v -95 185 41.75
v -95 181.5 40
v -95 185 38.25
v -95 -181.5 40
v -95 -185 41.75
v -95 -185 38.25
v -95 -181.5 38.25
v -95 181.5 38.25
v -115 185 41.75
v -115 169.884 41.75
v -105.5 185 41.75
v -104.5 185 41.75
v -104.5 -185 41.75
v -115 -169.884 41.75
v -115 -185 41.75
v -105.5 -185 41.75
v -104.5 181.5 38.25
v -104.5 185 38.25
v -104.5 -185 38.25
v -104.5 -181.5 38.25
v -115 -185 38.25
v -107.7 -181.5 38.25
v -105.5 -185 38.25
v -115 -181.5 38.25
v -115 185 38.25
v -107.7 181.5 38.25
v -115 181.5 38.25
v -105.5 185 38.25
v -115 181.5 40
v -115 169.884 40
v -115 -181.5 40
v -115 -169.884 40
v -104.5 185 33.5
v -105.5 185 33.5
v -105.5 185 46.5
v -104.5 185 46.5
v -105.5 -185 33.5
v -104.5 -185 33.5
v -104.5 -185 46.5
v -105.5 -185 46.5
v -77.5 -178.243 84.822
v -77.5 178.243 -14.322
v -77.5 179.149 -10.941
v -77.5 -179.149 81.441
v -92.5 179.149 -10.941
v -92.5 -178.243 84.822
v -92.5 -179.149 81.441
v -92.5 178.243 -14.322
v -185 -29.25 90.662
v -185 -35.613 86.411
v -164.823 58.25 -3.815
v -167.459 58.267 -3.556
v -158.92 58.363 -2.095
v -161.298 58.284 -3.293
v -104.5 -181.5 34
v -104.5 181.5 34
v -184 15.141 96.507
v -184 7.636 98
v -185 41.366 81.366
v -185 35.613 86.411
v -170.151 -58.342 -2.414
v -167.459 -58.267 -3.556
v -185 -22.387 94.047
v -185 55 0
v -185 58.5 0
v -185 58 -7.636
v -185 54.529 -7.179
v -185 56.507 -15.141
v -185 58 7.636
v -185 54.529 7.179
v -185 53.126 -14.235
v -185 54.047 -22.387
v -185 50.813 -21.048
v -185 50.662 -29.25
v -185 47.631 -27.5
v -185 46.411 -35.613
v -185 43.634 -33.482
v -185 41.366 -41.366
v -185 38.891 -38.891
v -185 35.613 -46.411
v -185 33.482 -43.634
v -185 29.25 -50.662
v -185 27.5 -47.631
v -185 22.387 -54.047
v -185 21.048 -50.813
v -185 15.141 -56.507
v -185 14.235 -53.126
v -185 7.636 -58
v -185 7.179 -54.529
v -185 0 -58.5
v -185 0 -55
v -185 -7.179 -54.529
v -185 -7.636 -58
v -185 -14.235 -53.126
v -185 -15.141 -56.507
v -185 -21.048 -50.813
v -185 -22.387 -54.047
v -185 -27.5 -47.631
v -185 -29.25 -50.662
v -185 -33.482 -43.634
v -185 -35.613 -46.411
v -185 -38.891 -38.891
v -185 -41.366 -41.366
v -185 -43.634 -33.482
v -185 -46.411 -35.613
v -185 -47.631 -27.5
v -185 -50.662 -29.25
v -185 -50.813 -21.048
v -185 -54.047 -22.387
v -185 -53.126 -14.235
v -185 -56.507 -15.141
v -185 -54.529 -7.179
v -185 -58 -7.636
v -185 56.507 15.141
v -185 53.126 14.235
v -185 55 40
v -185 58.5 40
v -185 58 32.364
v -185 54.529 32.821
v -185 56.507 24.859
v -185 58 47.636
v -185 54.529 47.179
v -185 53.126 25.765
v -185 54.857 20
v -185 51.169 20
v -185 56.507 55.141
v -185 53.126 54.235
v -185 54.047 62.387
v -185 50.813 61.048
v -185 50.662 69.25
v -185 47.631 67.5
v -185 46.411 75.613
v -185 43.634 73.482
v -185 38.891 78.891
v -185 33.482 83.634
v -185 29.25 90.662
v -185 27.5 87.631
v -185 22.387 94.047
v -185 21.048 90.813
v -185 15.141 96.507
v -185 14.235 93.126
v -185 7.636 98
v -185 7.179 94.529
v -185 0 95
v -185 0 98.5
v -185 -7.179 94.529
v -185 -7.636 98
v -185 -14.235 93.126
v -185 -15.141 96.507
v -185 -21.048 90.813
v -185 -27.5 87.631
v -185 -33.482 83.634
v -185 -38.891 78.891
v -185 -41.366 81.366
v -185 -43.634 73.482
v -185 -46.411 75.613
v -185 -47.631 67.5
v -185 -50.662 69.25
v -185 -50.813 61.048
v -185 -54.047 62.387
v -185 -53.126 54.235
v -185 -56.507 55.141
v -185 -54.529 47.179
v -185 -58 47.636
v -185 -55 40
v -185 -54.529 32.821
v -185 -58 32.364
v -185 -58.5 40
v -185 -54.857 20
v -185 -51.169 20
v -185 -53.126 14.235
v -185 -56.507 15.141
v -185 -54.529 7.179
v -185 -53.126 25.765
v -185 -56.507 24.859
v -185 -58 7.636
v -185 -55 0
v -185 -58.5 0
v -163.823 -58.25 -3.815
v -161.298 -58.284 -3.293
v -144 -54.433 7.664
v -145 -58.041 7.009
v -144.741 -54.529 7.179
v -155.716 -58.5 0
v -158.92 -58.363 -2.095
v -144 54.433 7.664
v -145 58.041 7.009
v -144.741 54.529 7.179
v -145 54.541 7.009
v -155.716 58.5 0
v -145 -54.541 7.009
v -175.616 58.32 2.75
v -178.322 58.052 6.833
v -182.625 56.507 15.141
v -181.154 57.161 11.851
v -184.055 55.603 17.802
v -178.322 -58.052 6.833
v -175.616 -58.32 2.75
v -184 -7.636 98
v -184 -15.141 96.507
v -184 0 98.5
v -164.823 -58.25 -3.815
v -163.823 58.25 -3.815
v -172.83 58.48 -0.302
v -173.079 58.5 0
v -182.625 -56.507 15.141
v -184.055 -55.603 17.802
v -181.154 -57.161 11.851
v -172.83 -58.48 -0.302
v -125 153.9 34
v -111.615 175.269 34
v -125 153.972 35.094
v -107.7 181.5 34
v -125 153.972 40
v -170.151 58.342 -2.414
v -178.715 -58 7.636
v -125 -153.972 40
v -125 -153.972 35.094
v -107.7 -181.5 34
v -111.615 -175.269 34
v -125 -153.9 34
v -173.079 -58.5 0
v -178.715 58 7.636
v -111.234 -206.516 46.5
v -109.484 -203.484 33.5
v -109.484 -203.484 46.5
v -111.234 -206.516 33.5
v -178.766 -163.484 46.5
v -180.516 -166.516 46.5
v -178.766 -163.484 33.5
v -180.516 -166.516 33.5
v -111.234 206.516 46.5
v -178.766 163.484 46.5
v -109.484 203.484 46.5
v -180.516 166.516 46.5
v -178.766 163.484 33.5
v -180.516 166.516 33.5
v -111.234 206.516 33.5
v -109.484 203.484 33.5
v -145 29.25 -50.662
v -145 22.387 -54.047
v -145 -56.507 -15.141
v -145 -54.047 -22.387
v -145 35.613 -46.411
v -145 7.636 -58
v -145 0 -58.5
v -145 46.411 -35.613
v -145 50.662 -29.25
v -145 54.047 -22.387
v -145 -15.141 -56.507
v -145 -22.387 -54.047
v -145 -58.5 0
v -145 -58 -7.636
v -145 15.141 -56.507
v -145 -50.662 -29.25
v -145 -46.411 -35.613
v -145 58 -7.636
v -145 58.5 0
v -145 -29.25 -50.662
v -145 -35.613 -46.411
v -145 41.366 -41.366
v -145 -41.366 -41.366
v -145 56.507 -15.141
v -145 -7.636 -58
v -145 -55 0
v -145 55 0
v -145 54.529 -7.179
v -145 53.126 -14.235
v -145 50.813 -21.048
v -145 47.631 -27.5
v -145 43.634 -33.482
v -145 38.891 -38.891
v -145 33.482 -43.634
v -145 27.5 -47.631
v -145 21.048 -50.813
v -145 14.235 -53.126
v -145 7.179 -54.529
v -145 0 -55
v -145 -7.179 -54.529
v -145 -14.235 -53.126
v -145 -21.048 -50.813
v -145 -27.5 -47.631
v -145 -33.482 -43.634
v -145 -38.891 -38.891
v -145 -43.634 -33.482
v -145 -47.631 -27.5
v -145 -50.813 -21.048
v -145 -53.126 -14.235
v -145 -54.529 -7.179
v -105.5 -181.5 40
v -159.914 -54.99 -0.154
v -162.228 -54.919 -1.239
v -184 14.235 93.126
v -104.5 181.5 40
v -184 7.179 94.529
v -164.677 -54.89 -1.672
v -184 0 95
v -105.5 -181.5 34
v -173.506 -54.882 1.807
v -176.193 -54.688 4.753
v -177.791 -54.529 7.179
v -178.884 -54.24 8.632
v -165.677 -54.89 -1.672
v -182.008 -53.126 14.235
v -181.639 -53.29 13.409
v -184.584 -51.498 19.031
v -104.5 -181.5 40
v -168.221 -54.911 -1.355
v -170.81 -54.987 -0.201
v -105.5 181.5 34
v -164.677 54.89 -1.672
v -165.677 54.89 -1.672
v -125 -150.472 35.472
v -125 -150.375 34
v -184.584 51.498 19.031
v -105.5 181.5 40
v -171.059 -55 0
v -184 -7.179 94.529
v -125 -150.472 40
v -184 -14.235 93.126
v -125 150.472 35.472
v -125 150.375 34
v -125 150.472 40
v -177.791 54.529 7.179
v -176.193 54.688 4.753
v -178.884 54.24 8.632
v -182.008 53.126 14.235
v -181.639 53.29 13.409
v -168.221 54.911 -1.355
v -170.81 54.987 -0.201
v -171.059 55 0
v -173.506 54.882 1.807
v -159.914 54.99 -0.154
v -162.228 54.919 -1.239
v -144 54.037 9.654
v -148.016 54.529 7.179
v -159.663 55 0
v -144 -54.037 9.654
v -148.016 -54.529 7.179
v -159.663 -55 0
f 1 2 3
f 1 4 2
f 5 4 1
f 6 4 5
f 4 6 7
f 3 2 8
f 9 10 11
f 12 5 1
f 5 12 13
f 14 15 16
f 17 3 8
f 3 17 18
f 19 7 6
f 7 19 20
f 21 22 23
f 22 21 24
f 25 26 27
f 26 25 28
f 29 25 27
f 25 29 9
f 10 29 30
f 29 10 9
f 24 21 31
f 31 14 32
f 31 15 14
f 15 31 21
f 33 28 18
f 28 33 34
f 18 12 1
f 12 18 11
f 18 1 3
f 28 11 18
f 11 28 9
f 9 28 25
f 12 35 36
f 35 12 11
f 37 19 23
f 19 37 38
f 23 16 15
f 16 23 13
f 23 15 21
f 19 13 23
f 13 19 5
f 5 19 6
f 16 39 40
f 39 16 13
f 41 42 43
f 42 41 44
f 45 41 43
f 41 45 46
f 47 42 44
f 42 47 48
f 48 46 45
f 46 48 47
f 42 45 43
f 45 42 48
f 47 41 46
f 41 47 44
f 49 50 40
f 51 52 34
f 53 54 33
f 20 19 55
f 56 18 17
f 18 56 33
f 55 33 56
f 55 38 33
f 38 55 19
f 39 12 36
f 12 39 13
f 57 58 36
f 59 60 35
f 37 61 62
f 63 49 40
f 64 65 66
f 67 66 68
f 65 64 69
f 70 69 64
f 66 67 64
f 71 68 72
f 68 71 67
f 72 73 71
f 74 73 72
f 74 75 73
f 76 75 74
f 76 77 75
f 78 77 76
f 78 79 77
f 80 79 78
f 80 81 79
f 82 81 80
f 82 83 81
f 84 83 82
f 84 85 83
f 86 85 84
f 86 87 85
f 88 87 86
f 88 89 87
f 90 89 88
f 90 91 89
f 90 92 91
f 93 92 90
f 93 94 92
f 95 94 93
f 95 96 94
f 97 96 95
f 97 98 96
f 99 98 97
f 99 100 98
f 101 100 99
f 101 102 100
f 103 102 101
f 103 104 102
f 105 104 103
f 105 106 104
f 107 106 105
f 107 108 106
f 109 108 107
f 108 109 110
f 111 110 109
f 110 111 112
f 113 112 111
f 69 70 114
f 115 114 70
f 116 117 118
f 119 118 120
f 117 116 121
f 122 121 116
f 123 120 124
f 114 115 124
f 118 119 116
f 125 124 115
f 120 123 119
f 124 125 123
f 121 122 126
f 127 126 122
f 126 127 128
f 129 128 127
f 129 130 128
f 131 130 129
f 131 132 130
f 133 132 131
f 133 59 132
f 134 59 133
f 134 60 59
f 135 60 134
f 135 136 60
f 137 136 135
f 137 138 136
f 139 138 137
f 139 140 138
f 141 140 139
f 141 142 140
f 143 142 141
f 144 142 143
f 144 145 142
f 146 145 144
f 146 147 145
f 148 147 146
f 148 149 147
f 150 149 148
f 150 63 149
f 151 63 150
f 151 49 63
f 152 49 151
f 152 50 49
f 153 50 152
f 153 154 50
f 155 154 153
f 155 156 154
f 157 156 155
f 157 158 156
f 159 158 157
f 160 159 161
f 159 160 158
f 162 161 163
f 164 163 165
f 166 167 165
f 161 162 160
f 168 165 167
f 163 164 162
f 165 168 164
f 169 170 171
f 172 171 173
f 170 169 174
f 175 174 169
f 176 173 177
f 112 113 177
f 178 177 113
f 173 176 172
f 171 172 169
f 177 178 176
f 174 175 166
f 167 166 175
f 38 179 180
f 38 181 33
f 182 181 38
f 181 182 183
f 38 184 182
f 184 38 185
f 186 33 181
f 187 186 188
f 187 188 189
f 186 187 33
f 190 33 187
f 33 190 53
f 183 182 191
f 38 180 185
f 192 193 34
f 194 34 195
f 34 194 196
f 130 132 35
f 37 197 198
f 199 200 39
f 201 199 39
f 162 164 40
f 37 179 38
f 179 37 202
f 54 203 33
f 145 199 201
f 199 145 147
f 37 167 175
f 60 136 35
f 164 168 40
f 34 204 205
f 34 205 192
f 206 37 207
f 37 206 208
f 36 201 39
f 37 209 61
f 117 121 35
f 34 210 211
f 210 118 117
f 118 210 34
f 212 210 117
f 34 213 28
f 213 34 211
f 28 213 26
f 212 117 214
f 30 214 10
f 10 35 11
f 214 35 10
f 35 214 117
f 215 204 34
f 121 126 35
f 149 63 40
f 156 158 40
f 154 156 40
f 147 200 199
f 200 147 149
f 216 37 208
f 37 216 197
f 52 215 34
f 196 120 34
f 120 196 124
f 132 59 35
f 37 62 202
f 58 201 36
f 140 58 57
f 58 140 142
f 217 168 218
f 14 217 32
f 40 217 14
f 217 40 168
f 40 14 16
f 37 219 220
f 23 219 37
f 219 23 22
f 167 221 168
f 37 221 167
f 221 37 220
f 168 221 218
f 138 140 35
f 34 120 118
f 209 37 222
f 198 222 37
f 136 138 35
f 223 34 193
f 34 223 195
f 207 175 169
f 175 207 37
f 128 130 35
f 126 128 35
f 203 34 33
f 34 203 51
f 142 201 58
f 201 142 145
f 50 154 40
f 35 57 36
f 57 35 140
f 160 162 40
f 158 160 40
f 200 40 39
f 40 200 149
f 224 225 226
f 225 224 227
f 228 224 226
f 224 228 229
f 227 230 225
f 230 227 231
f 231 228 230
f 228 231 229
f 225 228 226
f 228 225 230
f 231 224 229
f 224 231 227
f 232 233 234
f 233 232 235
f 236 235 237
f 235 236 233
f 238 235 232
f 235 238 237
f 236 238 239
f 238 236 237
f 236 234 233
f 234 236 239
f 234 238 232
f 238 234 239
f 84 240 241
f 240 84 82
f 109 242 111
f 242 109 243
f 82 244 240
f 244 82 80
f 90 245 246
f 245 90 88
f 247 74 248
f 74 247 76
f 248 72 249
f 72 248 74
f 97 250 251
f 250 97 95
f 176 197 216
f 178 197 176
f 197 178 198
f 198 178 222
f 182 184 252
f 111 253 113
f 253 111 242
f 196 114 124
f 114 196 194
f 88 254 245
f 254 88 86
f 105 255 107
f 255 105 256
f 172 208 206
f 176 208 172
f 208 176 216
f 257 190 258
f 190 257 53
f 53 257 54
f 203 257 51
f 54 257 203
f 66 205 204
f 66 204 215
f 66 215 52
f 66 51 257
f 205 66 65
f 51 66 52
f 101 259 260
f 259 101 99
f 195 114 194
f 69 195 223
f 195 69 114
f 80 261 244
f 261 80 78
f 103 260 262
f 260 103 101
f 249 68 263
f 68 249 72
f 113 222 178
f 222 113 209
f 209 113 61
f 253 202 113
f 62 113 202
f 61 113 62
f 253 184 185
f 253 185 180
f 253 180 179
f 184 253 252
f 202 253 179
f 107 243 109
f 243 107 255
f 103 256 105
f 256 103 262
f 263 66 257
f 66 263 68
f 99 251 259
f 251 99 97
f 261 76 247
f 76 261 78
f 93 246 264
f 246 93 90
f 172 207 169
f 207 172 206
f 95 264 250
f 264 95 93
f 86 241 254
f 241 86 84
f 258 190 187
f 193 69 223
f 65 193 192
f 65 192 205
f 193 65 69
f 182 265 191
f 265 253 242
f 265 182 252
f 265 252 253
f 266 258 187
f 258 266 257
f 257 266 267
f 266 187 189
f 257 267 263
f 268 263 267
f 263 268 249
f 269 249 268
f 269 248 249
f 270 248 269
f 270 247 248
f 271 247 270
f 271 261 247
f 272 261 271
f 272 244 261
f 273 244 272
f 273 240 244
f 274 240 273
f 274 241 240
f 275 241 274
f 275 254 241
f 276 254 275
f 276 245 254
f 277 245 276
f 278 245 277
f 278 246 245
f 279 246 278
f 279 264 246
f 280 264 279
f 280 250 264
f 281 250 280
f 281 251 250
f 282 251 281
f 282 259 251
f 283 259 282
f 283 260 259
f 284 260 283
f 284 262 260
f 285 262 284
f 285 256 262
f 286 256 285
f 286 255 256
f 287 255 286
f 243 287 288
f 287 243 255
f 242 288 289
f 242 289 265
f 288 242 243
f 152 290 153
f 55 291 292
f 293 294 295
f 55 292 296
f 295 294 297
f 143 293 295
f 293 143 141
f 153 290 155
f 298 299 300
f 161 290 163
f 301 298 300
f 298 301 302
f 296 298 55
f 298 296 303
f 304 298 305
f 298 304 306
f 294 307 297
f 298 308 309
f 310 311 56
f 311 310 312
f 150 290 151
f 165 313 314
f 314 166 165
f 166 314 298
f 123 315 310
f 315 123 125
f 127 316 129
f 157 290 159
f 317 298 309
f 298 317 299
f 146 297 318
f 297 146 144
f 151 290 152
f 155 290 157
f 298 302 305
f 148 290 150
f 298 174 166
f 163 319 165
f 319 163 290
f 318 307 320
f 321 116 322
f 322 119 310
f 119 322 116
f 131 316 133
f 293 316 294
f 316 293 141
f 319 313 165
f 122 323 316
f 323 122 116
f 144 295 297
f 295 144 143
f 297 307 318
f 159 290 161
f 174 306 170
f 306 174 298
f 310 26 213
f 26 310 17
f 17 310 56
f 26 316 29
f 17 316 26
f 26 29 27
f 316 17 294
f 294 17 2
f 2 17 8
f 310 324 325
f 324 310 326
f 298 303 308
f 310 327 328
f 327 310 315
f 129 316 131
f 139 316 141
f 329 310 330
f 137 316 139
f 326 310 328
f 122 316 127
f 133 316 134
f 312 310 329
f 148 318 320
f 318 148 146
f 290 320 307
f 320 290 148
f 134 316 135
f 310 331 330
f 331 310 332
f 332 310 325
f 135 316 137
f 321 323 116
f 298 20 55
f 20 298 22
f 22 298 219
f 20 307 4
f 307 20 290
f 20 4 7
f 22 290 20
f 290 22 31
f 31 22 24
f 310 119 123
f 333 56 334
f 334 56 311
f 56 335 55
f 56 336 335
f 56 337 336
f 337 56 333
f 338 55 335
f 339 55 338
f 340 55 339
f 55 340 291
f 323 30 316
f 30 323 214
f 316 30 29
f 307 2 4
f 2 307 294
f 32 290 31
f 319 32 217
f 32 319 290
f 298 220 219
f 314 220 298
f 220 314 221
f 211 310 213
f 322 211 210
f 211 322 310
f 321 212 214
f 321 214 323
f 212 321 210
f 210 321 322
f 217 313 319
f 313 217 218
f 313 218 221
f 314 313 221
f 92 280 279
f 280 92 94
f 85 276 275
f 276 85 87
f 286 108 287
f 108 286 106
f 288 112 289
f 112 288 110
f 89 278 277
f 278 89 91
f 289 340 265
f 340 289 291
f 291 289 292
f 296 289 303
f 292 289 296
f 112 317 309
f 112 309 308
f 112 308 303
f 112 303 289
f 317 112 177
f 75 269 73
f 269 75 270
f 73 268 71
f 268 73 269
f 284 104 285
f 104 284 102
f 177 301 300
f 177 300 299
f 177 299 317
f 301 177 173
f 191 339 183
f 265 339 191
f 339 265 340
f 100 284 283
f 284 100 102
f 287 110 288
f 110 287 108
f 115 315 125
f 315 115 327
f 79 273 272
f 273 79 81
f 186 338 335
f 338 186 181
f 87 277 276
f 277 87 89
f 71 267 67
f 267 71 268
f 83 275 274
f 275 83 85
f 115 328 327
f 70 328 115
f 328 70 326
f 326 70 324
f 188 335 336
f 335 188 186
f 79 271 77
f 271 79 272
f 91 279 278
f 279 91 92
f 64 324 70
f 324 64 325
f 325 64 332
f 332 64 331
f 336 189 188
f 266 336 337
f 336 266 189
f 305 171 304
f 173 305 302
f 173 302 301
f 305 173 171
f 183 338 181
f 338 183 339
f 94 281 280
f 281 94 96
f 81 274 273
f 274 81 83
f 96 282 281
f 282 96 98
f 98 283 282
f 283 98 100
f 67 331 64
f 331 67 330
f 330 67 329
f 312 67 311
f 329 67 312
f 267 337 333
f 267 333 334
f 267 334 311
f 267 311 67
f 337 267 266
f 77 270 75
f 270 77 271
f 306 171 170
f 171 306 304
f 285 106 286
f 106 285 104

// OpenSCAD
// VORTEX WATERFALL SPREADER — single piece, 340mm wide
// Re-designed to catch the spinning water from the vortex venturi
// The vortex makes the water sheet twist as it falls = light-catching waterfall
//
// Features:
// - 340mm wide (max single-piece on Qidi 350mm bed)
// - 6mm gap for visible water sheet
// - Angled lip (15° down) prevents wind blow-back
// - V-notches every 20mm break sheet into individual twisting streams
// - Flared side walls guide the spinning water into a smooth fan
//
// Print: PA12-CF, 0.2mm layer, flat on bed, NO supports needed

/* [Pipe Connection] */
INLET_DIA = 110;        // mm — matches vortex venturi outlet
COUPLING_DEPTH = 40;    // mm
WALL = 3.5;             // mm

/* [Spreader Geometry] */
SPREAD_WIDTH = 370;     // mm — max single-piece on 392mm X-axis (11mm margin each side)
GAP = 6;                // mm — slot opening (6mm = visible waterfall sheet + good aeration)
LIP_ANGLE = 15;         // degrees — downward angle for wind protection
TRANSITION_LENGTH = 80; // mm — round-inlet to rectangular-slot transition

/* [Vortex Enhancement] */
FLARE_ANGLE = 30;       // degrees — side walls flare outward to spread the spinning water
LIP_GLYPH_DEPTH = 4;    // mm — depth of V-notch glyphs on the lip

$fn = 48;

INNER_R = INLET_DIA / 2;
OUTER_R = INNER_R + WALL;

// Water entry tube + transition to wide slot
module spreader_body() {
    difference() {
        union() {
            // Inlet tube (connects to venturi outlet)
            translate([-SPREAD_WIDTH/2, 0, 0]) {
                rotate([0, 90, 0]) {
                    cylinder(h=COUPLING_DEPTH, r=OUTER_R);
                }
            }
            
            // Flared transition: round tube → wide rectangular slot
            translate([-SPREAD_WIDTH/2, 0, COUPLING_DEPTH]) {
                hull() {
                    // Inlet end (round)
                    translate([0, 0, 0]) {
                        rotate([0, 90, 0]) {
                            cylinder(h=1, r=OUTER_R);
                        }
                    }
                    // Outlet end (wide slot with flared sides)
                    translate([TRANSITION_LENGTH, 0, 0]) {
                        cube([1, SPREAD_WIDTH, GAP + WALL*2], center=true);
                    }
                }
                
                // Side wall flares — these guide the spinning water outward
                // Left flare
                translate([TRANSITION_LENGTH * 0.5, -SPREAD_WIDTH/2, 0]) {
                    rotate([0, 0, -FLARE_ANGLE]) {
                        cube([TRANSITION_LENGTH, WALL, GAP + WALL*2], center=true);
                    }
                }
                // Right flare
                translate([TRANSITION_LENGTH * 0.5, SPREAD_WIDTH/2, 0]) {
                    rotate([0, 0, FLARE_ANGLE]) {
                        cube([TRANSITION_LENGTH, WALL, GAP + WALL*2], center=true);
                    }
                }
                
                // Spreader lip (the business end)
                translate([TRANSITION_LENGTH, 0, 0]) {
                    // Upper lip
                    cube([20, SPREAD_WIDTH, WALL], center=true);
                    // Lower lip — angled down to prevent wind blow-back
                    translate([20, 0, -GAP/2 - WALL/2]) {
                        rotate([-LIP_ANGLE, 0, 0]) {
                            cube([15, SPREAD_WIDTH, WALL], center=true);
                        }
                    }
                }
            }
        }
        
        // Hollow interior — the water path
        translate([-SPREAD_WIDTH/2, 0, 0]) {
            rotate([0, 90, 0]) {
                cylinder(h=COUPLING_DEPTH + 1, r=INNER_R);
            }
        }
        
        // Transition to slot — hollow
        translate([-SPREAD_WIDTH/2, 0, COUPLING_DEPTH]) {
            hull() {
                translate([0, 0, 0]) {
                    rotate([0, 90, 0]) {
                        cylinder(h=1, r=INNER_R);
                    }
                }
                translate([TRANSITION_LENGTH, 0, 0]) {
                    translate([0, 0, -GAP/2]) {
                        cube([1, SPREAD_WIDTH - WALL*2, GAP], center=true);
                    }
                }
            }
            
            // Slot opening
            translate([TRANSITION_LENGTH, 0, 0]) {
                translate([-5, 0, -GAP/2]) {
                    cube([30, SPREAD_WIDTH - WALL*2, GAP], center=true);
                }
            }
        }
        
        // V-notch glyphs — breaks the sheet into individual twisting streams
        // The spinning water + these notches = helical waterfall
        num_notches = floor(SPREAD_WIDTH / 20);
        notch_spacing = SPREAD_WIDTH / num_notches;
        for (i = [0:num_notches-1]) {
            x_pos = -SPREAD_WIDTH/2 + notch_spacing/2 + i * notch_spacing;
            translate([-SPREAD_WIDTH/2 + COUPLING_DEPTH + TRANSITION_LENGTH + 25, x_pos, -GAP/2 - WALL - 1]) {
                rotate([90, 0, 0]) {
                    cylinder(h=WALL*3, r1=0, r2=LIP_GLYPH_DEPTH, $fn=3);
                }
            }
        }
    }
}

// Flange for bolting/sealing to venturi outlet
module flange() {
    translate([-SPREAD_WIDTH/2, 0, 0]) {
        rotate([0, 90, 0]) {
            difference() {
                cylinder(h=6, r=OUTER_R + 12);
                cylinder(h=7, r=OUTER_R);
                // 4× bolt holes on 130mm circle
                for (a = [0:90:270]) {
                    rotate([0, 0, a]) {
                        translate([0, 0, -1]) {
                            cylinder(h=8, r=3.5);
                        }
                    }
                }
            }
        }
    }
}

// Build
spreader_body();
// Optional: uncomment for bolt-on version
// flange();

echo(str("Spreader: ", SPREAD_WIDTH, "mm wide × ", GAP, "mm gap — waterfall sheet"));
echo(str("Fits bed: ", SPREAD_WIDTH < 350, " (350mm bed limit)"));
